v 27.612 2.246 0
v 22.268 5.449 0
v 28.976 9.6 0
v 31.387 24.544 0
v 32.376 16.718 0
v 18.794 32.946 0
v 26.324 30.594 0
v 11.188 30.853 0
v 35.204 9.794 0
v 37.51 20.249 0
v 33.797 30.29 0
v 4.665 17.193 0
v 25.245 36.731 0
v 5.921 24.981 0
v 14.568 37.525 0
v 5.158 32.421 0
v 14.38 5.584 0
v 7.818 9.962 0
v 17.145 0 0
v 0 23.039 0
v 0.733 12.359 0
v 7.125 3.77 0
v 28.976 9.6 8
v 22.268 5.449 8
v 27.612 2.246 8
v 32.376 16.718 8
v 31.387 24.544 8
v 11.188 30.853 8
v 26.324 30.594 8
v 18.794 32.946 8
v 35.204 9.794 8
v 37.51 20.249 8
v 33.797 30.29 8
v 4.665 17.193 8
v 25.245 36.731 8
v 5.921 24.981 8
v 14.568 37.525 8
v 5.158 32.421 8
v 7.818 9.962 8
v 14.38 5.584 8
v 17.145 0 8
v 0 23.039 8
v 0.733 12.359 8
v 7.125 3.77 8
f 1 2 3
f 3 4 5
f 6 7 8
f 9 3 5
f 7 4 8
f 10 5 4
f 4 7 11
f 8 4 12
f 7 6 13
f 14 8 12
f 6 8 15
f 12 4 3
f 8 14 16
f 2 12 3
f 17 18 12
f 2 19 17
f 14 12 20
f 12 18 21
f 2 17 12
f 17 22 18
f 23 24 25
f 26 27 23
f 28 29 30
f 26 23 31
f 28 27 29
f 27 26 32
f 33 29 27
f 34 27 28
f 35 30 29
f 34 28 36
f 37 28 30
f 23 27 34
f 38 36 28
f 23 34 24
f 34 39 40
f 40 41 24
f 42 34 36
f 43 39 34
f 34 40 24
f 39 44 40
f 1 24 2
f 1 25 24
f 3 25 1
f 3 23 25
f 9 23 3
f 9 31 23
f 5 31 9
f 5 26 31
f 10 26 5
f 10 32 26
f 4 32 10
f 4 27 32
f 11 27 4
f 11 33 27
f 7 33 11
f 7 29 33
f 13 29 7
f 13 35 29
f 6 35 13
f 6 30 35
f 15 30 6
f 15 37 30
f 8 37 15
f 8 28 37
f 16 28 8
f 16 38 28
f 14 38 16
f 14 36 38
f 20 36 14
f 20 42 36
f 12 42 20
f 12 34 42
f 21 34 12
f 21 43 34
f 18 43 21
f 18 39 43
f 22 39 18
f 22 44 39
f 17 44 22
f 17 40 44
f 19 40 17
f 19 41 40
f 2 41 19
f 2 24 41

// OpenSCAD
$fn = 32;

// ----------------------------------------------------------------------
// Chain sprocket: 11 teeth, 14 mm root radius
// ----------------------------------------------------------------------

// --- parameters (mm) ---
profile_height = 8;       // extrusion height
profile_points = 22;      // points of the closed outline

profile = [[32.376, 16.718], [37.51, 20.249], [31.387, 24.544], [33.797, 30.29], [26.324, 30.594], [25.245, 36.731], [18.794, 32.946], [14.568, 37.525], [11.188, 30.853], [5.158, 32.421], [5.921, 24.981], [0, 23.039], [4.665, 17.193], [0.733, 12.359], [7.818, 9.962], [7.125, 3.77], [14.38, 5.584], [17.145, 0], [22.268, 5.449], [27.612, 2.246], [28.976, 9.6], [35.204, 9.794]];  // single closed polygon, 22 points, counter clockwise

// --- the one profile operation ---
linear_extrude(height = profile_height) polygon(points = profile);
